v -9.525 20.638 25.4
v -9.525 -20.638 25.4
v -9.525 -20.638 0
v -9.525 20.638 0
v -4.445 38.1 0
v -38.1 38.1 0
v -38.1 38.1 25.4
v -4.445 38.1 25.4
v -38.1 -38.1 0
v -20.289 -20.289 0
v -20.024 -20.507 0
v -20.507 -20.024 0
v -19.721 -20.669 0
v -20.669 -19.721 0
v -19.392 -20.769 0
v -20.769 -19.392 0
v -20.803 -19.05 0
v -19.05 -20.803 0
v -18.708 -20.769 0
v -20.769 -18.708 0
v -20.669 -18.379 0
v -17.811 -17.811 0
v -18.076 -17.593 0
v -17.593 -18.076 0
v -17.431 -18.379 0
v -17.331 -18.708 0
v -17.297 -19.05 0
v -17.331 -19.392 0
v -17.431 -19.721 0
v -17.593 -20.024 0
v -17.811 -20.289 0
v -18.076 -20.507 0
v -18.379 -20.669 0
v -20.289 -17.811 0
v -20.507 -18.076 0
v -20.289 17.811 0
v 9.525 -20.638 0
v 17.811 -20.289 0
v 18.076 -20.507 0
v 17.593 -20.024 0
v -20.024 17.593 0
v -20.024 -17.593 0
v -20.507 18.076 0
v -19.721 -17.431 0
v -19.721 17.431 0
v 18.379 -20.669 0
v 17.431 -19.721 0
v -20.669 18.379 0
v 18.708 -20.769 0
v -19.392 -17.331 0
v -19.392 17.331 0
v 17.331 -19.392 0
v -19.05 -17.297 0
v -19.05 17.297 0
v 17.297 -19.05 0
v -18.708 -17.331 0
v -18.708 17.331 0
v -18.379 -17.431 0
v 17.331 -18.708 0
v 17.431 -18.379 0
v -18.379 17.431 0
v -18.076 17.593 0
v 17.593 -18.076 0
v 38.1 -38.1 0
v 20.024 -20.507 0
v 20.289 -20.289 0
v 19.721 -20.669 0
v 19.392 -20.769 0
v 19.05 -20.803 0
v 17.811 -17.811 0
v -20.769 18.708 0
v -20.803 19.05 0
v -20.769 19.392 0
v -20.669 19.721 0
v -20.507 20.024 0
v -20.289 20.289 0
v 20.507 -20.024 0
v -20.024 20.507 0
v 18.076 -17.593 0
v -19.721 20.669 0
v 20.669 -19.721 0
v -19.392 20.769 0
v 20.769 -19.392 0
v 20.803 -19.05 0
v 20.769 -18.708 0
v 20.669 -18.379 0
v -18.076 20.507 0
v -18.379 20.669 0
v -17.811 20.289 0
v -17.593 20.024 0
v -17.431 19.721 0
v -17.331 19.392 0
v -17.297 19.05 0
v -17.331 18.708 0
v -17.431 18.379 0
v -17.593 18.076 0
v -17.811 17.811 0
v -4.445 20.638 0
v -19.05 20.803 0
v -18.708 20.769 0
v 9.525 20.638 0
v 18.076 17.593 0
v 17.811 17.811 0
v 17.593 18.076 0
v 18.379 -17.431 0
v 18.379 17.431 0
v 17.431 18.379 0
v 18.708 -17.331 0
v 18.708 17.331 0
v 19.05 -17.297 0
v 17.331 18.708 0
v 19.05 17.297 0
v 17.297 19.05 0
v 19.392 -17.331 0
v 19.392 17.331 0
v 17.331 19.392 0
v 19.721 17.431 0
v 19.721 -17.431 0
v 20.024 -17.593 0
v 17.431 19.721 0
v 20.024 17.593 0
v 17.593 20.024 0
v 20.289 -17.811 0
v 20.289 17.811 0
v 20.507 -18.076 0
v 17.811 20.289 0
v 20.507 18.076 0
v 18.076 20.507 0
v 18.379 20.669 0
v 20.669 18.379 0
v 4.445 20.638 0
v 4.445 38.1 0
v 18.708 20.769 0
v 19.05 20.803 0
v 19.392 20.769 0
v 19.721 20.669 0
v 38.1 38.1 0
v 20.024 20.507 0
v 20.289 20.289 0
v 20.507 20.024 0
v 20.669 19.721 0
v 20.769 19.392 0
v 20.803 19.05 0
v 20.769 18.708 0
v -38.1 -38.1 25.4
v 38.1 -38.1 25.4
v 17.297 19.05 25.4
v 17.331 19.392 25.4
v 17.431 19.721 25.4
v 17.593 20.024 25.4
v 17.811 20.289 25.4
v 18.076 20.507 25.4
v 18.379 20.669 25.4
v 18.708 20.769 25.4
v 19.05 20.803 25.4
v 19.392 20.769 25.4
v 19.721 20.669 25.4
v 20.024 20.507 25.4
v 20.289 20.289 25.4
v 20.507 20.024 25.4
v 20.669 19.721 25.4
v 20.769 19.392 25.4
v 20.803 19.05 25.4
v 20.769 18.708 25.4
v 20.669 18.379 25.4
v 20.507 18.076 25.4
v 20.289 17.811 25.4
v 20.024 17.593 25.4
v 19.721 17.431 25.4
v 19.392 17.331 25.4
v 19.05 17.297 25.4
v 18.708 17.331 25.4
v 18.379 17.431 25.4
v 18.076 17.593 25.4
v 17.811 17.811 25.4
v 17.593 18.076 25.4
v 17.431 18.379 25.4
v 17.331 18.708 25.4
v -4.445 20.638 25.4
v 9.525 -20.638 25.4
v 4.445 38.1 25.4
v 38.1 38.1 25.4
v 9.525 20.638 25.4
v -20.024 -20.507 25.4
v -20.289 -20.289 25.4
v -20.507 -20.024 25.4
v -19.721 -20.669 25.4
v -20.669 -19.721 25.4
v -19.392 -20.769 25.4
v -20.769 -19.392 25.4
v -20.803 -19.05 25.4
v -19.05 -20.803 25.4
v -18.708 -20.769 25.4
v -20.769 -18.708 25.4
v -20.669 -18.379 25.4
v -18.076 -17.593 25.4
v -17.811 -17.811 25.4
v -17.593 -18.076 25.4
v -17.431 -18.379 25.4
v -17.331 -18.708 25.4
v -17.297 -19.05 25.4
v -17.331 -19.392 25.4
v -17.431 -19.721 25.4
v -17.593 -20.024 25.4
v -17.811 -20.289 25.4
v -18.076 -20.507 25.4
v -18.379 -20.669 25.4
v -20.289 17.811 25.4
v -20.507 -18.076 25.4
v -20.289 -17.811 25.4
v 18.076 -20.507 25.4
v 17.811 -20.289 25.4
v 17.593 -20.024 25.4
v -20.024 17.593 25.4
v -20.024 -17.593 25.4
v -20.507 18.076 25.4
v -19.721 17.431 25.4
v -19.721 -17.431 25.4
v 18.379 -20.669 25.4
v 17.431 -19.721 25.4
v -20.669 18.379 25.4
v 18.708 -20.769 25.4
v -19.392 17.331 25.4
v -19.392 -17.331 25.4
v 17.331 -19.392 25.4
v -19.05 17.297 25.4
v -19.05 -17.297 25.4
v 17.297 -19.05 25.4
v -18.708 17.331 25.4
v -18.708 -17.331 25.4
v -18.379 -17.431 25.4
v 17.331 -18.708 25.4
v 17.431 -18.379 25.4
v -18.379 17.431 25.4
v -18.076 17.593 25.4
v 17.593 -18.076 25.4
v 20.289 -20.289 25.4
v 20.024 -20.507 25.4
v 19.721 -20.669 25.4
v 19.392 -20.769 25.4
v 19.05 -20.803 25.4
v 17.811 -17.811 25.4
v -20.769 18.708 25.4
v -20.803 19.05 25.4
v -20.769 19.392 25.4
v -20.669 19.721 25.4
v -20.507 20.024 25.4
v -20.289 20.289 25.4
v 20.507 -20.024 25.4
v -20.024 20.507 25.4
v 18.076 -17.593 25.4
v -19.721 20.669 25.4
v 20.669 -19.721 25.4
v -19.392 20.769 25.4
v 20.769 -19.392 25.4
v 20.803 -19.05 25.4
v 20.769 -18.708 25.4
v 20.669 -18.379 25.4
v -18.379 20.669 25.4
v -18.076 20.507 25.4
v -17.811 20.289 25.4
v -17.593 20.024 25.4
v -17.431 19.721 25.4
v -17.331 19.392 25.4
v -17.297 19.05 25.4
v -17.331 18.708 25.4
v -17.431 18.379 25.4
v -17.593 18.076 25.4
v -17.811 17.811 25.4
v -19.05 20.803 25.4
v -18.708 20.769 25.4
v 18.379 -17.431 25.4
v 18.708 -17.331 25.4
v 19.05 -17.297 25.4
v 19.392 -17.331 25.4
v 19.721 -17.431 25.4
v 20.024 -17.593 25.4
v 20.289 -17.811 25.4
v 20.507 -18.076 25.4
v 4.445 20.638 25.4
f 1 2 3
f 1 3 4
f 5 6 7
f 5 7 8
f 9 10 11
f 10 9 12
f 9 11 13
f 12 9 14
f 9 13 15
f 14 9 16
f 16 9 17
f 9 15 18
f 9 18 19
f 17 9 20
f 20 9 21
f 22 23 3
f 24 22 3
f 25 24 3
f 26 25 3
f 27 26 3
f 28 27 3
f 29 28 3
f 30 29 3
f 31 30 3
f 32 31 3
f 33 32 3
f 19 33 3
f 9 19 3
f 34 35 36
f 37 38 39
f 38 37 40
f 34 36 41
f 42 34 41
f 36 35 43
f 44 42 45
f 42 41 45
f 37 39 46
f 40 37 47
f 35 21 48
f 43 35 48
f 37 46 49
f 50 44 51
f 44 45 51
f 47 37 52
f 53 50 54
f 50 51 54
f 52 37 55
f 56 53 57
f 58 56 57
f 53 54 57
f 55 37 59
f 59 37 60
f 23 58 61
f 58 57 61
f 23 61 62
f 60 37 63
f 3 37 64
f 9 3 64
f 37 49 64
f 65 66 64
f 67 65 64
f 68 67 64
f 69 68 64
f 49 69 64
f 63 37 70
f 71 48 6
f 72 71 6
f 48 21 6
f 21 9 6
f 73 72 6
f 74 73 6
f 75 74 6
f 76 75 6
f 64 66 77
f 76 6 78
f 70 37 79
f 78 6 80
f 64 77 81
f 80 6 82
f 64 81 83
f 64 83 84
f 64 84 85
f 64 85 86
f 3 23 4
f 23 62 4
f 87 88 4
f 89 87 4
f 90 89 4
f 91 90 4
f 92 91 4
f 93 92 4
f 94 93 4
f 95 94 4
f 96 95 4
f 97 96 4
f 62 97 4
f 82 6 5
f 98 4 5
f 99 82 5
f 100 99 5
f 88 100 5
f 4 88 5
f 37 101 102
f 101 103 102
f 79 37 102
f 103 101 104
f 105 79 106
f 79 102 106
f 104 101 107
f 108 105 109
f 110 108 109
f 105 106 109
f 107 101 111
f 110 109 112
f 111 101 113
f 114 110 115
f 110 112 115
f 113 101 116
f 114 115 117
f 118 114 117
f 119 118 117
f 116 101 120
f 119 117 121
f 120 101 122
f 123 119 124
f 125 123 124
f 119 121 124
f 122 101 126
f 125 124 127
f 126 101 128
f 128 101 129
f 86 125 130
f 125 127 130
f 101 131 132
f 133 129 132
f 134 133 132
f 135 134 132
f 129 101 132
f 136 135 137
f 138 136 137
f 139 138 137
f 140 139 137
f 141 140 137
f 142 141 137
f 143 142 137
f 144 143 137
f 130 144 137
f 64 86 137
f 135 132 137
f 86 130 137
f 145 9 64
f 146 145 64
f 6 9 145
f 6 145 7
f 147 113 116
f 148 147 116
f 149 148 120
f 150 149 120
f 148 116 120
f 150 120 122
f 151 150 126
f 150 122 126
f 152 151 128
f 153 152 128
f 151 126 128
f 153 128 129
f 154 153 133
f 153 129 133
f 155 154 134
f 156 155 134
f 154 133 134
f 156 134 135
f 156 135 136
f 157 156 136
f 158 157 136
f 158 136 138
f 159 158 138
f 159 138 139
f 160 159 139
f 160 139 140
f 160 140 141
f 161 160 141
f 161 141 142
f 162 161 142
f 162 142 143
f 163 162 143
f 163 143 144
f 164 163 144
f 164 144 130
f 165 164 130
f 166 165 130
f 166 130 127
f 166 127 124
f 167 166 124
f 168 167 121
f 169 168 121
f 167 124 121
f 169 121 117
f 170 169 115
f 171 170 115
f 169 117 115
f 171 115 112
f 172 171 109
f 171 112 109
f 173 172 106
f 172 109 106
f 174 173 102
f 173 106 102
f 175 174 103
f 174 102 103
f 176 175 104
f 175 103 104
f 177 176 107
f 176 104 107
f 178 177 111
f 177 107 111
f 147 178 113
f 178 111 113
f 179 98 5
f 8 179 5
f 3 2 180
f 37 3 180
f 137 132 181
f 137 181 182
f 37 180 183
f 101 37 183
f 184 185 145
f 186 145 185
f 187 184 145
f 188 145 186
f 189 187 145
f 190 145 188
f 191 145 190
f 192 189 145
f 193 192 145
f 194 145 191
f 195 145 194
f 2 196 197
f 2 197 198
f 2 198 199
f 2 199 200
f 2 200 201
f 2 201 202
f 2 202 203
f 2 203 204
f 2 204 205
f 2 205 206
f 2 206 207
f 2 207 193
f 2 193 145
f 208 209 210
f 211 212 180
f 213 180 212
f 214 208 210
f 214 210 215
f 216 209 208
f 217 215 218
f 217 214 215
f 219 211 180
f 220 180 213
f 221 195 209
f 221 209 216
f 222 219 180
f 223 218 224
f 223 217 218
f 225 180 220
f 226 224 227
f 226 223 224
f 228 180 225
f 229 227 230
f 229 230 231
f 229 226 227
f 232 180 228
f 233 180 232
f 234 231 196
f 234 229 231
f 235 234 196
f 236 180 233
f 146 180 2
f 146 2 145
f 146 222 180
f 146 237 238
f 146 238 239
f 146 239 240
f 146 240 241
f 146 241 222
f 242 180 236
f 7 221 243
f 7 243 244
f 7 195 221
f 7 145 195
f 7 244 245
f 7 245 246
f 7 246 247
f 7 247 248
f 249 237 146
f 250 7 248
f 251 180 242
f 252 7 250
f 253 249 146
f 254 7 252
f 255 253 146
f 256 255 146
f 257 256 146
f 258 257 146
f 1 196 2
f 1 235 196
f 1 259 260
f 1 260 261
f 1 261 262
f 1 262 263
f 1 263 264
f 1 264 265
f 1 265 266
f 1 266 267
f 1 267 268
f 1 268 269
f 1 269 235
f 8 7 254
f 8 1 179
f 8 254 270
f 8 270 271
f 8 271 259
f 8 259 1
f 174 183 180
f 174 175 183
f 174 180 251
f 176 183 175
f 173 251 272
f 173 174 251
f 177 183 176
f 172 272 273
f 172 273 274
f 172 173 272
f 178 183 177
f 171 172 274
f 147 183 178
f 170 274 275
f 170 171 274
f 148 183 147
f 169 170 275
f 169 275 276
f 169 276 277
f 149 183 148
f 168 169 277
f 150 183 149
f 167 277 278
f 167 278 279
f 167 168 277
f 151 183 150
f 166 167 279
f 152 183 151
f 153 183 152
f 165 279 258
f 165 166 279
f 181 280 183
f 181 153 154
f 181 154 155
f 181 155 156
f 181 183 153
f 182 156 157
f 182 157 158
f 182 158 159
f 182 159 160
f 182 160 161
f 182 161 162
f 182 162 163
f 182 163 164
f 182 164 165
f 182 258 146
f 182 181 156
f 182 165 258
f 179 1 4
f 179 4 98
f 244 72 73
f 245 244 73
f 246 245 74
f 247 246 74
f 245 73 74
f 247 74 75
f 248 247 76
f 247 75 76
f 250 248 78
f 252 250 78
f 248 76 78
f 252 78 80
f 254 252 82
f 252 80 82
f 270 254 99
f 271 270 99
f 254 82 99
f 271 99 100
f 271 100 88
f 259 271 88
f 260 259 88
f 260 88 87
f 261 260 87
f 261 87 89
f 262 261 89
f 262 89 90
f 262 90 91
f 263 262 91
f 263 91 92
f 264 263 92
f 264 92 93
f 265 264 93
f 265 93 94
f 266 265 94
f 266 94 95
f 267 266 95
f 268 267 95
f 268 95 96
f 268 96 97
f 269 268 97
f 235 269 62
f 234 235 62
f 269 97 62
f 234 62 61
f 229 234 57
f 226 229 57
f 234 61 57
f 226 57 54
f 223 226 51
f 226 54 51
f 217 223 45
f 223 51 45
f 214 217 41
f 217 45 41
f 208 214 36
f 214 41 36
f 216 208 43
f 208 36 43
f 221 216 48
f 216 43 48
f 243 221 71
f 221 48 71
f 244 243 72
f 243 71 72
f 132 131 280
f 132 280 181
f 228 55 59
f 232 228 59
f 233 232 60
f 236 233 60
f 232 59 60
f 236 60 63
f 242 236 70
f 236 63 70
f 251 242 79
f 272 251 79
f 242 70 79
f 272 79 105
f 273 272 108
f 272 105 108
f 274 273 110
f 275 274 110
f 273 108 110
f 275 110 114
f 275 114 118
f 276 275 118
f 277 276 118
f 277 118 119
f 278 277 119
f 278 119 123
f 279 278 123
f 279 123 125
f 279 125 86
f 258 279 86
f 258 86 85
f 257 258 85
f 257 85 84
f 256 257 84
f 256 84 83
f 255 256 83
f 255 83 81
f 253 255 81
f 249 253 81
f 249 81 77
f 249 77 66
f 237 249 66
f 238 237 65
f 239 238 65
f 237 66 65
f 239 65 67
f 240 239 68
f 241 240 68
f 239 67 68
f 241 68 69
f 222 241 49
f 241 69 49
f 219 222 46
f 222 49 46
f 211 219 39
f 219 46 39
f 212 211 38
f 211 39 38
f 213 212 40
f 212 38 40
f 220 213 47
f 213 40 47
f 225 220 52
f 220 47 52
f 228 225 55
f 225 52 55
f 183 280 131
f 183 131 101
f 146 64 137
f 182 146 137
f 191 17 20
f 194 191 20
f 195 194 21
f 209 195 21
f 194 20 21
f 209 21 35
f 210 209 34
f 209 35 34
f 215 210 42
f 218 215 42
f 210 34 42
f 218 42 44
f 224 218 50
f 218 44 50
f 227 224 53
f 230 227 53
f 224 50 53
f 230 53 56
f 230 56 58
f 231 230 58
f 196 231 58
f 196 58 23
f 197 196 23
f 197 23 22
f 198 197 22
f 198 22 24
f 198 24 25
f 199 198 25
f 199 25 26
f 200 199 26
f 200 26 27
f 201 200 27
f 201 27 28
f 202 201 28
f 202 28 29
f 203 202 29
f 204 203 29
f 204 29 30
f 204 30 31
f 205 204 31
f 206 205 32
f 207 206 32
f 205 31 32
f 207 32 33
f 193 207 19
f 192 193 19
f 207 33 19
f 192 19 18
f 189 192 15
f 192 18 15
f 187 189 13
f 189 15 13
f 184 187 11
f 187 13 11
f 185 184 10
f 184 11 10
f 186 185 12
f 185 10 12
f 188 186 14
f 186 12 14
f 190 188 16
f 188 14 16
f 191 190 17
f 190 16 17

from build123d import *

# Parameters (mm, degrees)
F0_W     = 76.2
F0_H     = 76.2
F1_DEPTH = 25.4
F2_W     = 19.05
F2_H     = 41.275
F3_DEPTH = 25.4
F4_W     = 8.89
F4_H     = 17.4625
F5_DEPTH = 25.4
F7_D     = 3.5052


with BuildPart() as f1:
    # F0 (on Top) → F1 (new body)
    with BuildSketch(Plane.XY):
        Rectangle(F0_W, F0_H)
    extrude(amount=F1_DEPTH)

    # F2 (on face) → F3 (cut)
    with BuildSketch(Plane.XY.offset(25.4)):
        Rectangle(F2_W, F2_H)
    extrude(amount=-F3_DEPTH, mode=Mode.SUBTRACT)

    # F4 (on face) → F5 (cut)
    with BuildSketch(Plane.XY.offset(25.4)):
        with Locations((0, 29.36875)):
            Rectangle(F4_W, F4_H)
    extrude(amount=-F5_DEPTH, mode=Mode.SUBTRACT)

    # F7 (through all)
    with Locations(Plane.XY.offset(25.4)):
        with Locations((-19.05, 19.05), (-19.05, -19.05), (19.05, -19.05), (19.05, 19.05)):
            Hole(F7_D / 2)


solid = f1.part
